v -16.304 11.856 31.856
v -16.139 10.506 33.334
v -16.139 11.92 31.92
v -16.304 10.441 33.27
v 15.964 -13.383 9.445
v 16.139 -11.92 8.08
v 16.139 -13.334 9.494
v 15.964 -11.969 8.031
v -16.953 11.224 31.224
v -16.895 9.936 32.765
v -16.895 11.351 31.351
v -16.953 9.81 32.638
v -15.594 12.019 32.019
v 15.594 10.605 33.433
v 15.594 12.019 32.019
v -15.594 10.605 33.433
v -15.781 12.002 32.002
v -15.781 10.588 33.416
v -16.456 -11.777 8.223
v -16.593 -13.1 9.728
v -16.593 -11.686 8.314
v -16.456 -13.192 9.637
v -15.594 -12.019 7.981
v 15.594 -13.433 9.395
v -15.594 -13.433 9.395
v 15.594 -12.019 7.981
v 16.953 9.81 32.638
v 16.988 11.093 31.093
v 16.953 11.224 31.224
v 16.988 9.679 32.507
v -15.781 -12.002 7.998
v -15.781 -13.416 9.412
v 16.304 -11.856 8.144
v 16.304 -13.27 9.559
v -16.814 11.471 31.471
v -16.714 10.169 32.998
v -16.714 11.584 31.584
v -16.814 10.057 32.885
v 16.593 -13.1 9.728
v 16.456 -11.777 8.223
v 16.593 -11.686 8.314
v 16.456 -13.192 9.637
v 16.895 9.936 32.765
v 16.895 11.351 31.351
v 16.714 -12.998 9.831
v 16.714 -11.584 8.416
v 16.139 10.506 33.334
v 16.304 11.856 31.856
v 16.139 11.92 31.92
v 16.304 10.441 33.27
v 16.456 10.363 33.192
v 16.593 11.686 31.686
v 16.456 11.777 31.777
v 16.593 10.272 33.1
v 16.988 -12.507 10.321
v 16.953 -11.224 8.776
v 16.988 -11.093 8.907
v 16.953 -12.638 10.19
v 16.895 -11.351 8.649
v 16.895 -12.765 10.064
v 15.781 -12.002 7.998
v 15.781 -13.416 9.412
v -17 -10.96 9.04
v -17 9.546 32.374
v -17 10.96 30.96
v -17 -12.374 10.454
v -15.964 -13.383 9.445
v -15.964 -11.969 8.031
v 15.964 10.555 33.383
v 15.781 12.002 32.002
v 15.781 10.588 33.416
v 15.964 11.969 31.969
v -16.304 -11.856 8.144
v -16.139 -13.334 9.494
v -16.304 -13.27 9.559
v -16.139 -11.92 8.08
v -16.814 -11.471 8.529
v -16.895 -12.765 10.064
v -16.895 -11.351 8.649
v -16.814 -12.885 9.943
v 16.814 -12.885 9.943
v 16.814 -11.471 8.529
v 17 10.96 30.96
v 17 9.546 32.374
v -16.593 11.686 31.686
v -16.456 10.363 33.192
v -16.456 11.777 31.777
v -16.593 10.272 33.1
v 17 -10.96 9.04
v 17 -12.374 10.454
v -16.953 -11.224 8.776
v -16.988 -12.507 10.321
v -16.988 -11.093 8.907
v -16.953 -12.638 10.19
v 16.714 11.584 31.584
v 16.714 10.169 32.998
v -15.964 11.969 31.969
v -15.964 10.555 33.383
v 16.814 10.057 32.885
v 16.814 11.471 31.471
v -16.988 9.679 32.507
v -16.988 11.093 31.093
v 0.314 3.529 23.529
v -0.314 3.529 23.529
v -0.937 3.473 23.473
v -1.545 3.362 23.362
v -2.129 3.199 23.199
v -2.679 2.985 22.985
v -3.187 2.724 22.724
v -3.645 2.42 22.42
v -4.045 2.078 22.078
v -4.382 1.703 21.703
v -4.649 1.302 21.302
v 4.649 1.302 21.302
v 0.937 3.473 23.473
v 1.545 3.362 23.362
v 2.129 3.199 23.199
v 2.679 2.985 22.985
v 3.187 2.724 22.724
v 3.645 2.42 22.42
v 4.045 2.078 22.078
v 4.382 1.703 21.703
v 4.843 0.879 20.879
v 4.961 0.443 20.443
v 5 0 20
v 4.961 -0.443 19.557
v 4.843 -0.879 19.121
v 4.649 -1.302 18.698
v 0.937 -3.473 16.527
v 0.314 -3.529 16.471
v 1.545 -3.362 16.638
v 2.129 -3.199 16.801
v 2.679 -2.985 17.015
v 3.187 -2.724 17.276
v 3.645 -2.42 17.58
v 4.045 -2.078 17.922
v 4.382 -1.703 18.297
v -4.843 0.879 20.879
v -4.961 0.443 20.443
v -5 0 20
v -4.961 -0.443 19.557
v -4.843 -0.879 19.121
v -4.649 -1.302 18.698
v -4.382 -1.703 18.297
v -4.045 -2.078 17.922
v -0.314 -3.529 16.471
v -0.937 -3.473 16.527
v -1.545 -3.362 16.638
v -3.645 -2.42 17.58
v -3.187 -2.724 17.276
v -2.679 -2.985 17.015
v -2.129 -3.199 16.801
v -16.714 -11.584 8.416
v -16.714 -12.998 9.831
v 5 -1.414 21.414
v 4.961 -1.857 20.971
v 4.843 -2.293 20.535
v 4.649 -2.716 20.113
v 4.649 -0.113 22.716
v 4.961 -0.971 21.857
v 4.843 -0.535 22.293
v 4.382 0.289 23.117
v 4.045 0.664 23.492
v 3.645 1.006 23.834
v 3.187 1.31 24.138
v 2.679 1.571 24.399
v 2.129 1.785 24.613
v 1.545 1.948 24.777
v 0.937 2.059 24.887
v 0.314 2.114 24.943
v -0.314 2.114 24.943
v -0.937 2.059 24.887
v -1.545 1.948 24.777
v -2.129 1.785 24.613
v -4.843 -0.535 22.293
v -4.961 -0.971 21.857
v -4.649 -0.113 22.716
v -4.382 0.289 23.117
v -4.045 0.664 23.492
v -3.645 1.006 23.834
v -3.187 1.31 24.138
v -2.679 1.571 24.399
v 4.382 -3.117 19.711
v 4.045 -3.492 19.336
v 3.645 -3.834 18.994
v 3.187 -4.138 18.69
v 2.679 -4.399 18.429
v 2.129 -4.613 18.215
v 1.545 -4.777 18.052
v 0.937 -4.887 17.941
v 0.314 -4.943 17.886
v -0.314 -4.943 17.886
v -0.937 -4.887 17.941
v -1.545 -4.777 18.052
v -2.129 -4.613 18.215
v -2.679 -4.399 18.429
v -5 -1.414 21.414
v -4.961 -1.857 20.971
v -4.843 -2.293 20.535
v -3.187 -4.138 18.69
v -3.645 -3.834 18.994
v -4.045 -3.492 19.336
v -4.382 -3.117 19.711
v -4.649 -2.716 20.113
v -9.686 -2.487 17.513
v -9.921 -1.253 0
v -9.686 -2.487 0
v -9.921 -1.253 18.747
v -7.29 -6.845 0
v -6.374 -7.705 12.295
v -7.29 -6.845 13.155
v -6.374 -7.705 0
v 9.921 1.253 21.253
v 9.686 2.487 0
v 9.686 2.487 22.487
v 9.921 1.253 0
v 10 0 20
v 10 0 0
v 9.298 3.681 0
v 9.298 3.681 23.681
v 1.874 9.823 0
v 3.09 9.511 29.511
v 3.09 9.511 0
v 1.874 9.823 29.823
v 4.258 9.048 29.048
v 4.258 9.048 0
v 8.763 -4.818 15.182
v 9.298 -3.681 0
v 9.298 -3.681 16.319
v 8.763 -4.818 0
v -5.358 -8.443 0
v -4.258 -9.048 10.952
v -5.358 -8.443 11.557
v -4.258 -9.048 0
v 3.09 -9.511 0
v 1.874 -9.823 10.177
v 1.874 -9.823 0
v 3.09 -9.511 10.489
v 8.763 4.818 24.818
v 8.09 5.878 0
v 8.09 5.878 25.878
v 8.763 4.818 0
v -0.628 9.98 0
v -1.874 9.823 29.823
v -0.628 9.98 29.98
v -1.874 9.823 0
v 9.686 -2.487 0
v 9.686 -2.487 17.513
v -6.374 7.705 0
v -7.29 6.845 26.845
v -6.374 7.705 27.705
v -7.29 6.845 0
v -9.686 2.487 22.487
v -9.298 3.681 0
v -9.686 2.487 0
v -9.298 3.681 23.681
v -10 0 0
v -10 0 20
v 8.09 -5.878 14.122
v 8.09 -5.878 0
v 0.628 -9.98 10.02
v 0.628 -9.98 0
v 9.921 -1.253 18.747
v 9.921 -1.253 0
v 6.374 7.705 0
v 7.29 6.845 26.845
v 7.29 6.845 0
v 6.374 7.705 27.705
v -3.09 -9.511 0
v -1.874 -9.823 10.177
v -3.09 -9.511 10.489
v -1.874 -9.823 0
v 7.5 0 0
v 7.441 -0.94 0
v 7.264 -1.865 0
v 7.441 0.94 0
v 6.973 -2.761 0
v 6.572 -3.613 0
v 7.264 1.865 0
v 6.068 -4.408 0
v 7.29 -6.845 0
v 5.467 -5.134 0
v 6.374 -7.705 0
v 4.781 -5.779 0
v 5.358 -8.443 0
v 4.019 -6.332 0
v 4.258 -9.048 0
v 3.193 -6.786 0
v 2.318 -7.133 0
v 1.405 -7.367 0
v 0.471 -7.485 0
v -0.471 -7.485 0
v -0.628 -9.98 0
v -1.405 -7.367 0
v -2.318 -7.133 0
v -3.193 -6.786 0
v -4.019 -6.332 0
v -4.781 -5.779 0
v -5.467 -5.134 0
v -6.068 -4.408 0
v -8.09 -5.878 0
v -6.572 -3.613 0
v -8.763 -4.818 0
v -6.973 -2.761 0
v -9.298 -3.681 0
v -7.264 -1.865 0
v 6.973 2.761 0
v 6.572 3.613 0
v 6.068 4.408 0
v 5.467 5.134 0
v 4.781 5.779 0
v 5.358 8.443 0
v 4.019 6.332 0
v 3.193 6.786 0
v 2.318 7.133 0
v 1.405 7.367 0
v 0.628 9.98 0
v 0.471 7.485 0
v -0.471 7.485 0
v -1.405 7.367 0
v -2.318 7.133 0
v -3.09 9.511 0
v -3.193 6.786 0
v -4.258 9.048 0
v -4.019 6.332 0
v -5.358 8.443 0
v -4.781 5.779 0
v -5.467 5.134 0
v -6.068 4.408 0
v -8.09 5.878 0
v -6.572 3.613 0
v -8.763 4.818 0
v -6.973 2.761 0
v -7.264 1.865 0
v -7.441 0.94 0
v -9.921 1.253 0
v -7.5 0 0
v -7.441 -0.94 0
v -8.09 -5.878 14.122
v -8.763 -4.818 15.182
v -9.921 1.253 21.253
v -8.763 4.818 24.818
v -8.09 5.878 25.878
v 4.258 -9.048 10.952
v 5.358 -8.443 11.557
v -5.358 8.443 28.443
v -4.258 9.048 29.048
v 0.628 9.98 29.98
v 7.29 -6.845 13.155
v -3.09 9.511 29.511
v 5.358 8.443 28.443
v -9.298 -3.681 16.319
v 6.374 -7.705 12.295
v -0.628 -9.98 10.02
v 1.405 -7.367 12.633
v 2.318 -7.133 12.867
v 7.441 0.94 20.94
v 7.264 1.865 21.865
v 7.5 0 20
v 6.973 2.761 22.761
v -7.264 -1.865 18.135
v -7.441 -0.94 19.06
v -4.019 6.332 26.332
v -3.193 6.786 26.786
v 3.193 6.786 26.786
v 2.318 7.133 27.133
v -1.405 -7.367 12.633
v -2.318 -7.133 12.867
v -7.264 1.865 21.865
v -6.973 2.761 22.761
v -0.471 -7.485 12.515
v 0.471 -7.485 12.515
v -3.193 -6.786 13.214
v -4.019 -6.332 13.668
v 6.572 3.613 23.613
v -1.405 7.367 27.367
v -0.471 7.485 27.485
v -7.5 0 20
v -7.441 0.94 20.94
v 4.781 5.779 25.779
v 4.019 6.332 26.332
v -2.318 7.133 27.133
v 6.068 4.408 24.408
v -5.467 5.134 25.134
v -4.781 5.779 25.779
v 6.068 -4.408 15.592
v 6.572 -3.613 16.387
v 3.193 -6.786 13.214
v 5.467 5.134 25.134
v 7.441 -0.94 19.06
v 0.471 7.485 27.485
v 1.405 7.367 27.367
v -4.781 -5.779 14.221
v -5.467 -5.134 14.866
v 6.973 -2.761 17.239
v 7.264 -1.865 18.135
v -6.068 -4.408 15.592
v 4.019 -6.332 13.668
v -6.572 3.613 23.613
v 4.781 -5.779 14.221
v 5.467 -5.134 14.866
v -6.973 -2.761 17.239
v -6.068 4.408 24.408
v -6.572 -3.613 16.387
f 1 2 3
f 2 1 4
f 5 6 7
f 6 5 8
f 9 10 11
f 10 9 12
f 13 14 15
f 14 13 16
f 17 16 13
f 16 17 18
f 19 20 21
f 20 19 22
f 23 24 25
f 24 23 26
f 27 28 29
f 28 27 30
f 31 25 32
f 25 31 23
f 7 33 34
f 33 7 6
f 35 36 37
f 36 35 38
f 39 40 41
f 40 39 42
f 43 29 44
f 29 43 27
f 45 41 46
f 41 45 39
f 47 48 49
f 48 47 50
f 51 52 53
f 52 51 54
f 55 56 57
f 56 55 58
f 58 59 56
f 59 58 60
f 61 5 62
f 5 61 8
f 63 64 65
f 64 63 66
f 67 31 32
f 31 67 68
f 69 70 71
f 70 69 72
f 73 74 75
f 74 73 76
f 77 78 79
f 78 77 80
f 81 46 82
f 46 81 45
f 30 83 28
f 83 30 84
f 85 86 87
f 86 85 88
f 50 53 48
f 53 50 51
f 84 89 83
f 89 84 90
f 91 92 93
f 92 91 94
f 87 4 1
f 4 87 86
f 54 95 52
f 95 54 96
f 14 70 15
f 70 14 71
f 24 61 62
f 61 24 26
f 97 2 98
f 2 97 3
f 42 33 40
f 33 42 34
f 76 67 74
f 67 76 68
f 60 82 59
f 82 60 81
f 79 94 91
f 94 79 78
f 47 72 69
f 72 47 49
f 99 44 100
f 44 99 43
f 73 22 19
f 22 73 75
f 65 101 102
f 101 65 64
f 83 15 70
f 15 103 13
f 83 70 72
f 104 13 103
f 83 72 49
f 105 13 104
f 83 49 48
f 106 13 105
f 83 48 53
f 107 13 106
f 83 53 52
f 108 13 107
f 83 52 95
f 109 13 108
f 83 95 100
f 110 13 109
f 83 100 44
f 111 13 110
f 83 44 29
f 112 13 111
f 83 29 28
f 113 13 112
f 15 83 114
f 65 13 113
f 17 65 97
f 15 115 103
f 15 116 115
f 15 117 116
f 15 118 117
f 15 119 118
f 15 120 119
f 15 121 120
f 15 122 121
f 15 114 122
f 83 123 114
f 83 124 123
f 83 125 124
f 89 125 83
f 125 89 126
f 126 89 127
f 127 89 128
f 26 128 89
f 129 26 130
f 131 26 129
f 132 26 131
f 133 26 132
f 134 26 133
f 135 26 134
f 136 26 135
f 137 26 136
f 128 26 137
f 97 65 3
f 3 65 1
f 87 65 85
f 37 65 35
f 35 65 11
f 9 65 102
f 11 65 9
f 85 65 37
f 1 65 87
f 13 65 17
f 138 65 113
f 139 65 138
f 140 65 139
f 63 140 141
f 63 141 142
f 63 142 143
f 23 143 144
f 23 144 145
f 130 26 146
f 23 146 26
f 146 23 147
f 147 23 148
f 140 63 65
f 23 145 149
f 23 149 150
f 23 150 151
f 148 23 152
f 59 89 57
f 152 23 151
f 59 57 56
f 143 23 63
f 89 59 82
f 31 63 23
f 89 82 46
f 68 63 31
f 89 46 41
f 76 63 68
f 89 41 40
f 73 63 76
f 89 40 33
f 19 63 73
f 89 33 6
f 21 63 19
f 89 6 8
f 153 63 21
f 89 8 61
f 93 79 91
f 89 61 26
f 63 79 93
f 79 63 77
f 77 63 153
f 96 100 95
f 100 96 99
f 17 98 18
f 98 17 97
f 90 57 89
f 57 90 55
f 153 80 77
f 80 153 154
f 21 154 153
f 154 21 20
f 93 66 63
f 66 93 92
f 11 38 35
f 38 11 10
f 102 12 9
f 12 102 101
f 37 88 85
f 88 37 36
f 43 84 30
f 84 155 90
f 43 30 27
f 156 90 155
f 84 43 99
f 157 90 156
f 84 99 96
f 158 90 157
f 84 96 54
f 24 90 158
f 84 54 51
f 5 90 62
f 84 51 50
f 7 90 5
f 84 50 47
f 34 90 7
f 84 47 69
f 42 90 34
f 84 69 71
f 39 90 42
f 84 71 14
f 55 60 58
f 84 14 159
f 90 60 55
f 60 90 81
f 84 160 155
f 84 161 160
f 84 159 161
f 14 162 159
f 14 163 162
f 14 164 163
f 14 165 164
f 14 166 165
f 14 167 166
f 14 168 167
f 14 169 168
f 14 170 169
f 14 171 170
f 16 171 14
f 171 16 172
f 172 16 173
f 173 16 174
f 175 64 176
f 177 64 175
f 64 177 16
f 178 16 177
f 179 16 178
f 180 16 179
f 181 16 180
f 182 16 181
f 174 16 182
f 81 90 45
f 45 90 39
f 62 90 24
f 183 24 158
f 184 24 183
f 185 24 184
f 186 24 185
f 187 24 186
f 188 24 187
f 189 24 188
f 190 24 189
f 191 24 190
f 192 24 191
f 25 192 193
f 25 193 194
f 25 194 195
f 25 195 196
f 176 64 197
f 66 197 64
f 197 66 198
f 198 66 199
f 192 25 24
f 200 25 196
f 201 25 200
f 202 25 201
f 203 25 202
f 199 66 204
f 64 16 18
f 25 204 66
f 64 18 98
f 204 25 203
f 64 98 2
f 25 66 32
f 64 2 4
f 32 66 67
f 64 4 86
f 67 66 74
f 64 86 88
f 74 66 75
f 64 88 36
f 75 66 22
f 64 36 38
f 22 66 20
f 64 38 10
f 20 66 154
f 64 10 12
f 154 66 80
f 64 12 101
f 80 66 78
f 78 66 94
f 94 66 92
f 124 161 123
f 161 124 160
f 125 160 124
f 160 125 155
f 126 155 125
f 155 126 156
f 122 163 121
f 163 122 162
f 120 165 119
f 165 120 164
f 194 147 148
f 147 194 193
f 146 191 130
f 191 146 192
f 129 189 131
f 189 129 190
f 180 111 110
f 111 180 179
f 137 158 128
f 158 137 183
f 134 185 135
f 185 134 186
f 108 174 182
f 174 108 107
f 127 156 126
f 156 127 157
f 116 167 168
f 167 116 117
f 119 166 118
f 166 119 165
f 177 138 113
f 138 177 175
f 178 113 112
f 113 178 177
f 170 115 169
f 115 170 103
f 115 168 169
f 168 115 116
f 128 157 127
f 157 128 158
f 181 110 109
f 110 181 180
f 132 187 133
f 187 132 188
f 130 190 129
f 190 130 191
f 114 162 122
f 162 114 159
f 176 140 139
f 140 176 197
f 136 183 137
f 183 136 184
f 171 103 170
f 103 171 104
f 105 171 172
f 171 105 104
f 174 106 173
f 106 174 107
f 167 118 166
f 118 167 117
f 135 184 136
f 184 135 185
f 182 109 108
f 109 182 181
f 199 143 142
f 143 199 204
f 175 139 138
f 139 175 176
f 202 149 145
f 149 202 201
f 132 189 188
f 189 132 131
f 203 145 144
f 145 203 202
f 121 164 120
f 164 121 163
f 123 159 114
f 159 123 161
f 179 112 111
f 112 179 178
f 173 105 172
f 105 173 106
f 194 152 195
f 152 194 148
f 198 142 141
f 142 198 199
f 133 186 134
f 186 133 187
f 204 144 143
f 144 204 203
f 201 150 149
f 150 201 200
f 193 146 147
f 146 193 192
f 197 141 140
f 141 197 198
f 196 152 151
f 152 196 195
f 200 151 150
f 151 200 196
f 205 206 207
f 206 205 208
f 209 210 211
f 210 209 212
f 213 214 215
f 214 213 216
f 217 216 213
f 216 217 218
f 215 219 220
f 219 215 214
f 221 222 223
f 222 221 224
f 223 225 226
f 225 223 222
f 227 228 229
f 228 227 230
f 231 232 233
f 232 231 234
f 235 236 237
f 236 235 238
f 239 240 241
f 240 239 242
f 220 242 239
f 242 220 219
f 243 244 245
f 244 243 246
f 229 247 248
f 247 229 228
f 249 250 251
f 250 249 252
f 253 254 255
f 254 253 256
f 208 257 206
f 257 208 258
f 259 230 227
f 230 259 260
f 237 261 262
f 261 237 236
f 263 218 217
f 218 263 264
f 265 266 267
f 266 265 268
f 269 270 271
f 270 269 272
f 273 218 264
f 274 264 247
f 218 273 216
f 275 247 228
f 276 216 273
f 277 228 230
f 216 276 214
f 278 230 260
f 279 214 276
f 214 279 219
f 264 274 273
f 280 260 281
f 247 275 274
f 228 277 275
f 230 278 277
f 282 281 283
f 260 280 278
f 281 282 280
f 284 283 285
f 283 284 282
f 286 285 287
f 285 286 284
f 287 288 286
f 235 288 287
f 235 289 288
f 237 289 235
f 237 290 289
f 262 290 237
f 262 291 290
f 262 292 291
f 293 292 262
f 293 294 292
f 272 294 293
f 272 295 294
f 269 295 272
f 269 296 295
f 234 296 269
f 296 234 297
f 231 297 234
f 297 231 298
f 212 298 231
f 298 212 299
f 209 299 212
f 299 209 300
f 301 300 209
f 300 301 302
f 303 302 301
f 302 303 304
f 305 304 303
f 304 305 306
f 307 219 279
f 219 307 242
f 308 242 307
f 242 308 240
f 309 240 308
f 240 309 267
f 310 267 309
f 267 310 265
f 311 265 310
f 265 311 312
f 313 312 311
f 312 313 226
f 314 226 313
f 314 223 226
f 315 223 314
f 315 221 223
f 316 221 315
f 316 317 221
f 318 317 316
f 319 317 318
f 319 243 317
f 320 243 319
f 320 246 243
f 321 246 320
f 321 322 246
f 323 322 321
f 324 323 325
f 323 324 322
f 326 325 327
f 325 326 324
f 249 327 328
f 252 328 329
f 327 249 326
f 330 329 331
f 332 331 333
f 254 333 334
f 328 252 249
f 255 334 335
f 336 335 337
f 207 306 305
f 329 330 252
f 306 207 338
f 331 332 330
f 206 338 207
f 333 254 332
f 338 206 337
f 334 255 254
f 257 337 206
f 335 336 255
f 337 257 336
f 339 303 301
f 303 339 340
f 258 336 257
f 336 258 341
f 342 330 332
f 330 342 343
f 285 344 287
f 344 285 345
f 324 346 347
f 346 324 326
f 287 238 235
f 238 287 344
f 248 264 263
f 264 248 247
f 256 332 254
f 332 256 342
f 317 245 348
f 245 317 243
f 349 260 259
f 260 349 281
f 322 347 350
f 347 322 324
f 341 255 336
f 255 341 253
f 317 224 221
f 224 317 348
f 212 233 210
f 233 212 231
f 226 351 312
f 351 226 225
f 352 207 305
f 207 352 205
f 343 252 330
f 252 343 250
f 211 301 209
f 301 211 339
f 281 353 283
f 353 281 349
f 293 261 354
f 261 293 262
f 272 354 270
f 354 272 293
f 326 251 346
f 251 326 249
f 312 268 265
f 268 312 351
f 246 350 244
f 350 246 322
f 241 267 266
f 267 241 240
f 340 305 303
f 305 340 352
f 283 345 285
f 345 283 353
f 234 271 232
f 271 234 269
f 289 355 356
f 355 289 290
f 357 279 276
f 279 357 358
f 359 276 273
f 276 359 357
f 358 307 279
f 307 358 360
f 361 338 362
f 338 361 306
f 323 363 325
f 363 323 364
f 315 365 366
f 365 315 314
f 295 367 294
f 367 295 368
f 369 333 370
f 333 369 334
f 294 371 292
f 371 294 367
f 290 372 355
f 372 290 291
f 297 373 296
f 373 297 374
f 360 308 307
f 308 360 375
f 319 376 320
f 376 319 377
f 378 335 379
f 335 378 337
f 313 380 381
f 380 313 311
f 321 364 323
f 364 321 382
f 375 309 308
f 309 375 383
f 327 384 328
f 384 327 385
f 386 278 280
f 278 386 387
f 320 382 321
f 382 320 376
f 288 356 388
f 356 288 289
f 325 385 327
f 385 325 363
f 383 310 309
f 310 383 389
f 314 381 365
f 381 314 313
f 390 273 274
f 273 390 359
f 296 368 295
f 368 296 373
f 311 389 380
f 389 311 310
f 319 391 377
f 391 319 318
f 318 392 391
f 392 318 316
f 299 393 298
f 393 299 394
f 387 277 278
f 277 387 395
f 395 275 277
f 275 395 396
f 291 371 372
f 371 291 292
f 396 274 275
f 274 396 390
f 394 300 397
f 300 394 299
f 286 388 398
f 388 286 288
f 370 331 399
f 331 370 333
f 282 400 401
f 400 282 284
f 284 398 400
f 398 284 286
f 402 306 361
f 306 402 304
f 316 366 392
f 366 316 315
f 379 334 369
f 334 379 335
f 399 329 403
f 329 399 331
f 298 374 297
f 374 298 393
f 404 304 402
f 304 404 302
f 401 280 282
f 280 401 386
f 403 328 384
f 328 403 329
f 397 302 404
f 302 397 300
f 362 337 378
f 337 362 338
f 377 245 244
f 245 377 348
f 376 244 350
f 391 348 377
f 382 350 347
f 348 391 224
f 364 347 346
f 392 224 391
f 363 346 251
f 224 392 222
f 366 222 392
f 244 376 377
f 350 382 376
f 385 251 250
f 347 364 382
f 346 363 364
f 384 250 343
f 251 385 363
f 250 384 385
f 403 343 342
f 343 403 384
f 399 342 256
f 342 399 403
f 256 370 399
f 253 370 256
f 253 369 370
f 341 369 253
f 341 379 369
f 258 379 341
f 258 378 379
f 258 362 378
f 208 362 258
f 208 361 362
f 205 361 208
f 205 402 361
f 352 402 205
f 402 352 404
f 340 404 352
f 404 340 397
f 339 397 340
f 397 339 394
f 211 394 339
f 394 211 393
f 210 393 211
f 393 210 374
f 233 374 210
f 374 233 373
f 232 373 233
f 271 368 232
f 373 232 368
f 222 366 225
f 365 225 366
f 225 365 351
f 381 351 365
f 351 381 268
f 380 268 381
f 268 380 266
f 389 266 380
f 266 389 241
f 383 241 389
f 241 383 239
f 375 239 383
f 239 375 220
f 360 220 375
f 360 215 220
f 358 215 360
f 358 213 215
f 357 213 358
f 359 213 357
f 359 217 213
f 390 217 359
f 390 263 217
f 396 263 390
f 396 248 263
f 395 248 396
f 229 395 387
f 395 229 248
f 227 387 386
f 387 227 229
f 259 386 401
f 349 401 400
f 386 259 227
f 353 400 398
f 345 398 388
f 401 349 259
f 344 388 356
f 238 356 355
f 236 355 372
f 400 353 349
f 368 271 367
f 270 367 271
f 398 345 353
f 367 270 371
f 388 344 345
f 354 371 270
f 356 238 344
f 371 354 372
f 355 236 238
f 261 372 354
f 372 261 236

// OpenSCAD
PLATE_THICKNESS = 2;
PLATE_WIDTH = 34;
PLATE_LENGTH = 34;
PLATE_ANGLE = 45;
PLATE_HOLE_DIA = 10;

COLUMN_HEIGHT = 20;
COLUMN_OUTER_DIA = 20;
COLUMN_INNER_DIA = 15;

PIPE_OUTER_DIA = 25;
PIPE_INNER_DIA = COLUMN_OUTER_DIA;
PIPE_HEIGHT = 50;

$fn = 50;

module rounded_rect(width, length, height, corner_dia) {
  hull() {
    for(i = [-1, 1]) {
      for(j = [-1, 1]) {
        translate([i * (width - corner_dia)/2, j * (length - corner_dia)/2, 0])
        cylinder(d = corner_dia, h = height);
      }
    }
  }
}

module plate() {
  rotate([PLATE_ANGLE, 0, 0])
  difference() {
    rounded_rect(PLATE_WIDTH, PLATE_LENGTH, PLATE_THICKNESS, 3);
    cylinder(d = PLATE_HOLE_DIA, h = PLATE_THICKNESS);
  }
}

module pipe(od, id, height) {
  difference() {
    cylinder(d = od, h = height);
    cylinder(d = id, h = height);
  }
}

module column() {
  difference() {
    pipe(COLUMN_OUTER_DIA, COLUMN_INNER_DIA, COLUMN_HEIGHT + PLATE_LENGTH/3);
    translate([0, 0, COLUMN_HEIGHT])
    rotate([PLATE_ANGLE, 0, 0])
    translate([0, 0, COLUMN_HEIGHT])
    cube([COLUMN_HEIGHT * 2, COLUMN_HEIGHT * 2, COLUMN_HEIGHT * 2], center = true);
  }
}

translate([0, 0, COLUMN_HEIGHT])
plate();
column();

//pipe(PIPE_OUTER_DIA, PIPE_INNER_DIA, PIPE_HEIGHT);
